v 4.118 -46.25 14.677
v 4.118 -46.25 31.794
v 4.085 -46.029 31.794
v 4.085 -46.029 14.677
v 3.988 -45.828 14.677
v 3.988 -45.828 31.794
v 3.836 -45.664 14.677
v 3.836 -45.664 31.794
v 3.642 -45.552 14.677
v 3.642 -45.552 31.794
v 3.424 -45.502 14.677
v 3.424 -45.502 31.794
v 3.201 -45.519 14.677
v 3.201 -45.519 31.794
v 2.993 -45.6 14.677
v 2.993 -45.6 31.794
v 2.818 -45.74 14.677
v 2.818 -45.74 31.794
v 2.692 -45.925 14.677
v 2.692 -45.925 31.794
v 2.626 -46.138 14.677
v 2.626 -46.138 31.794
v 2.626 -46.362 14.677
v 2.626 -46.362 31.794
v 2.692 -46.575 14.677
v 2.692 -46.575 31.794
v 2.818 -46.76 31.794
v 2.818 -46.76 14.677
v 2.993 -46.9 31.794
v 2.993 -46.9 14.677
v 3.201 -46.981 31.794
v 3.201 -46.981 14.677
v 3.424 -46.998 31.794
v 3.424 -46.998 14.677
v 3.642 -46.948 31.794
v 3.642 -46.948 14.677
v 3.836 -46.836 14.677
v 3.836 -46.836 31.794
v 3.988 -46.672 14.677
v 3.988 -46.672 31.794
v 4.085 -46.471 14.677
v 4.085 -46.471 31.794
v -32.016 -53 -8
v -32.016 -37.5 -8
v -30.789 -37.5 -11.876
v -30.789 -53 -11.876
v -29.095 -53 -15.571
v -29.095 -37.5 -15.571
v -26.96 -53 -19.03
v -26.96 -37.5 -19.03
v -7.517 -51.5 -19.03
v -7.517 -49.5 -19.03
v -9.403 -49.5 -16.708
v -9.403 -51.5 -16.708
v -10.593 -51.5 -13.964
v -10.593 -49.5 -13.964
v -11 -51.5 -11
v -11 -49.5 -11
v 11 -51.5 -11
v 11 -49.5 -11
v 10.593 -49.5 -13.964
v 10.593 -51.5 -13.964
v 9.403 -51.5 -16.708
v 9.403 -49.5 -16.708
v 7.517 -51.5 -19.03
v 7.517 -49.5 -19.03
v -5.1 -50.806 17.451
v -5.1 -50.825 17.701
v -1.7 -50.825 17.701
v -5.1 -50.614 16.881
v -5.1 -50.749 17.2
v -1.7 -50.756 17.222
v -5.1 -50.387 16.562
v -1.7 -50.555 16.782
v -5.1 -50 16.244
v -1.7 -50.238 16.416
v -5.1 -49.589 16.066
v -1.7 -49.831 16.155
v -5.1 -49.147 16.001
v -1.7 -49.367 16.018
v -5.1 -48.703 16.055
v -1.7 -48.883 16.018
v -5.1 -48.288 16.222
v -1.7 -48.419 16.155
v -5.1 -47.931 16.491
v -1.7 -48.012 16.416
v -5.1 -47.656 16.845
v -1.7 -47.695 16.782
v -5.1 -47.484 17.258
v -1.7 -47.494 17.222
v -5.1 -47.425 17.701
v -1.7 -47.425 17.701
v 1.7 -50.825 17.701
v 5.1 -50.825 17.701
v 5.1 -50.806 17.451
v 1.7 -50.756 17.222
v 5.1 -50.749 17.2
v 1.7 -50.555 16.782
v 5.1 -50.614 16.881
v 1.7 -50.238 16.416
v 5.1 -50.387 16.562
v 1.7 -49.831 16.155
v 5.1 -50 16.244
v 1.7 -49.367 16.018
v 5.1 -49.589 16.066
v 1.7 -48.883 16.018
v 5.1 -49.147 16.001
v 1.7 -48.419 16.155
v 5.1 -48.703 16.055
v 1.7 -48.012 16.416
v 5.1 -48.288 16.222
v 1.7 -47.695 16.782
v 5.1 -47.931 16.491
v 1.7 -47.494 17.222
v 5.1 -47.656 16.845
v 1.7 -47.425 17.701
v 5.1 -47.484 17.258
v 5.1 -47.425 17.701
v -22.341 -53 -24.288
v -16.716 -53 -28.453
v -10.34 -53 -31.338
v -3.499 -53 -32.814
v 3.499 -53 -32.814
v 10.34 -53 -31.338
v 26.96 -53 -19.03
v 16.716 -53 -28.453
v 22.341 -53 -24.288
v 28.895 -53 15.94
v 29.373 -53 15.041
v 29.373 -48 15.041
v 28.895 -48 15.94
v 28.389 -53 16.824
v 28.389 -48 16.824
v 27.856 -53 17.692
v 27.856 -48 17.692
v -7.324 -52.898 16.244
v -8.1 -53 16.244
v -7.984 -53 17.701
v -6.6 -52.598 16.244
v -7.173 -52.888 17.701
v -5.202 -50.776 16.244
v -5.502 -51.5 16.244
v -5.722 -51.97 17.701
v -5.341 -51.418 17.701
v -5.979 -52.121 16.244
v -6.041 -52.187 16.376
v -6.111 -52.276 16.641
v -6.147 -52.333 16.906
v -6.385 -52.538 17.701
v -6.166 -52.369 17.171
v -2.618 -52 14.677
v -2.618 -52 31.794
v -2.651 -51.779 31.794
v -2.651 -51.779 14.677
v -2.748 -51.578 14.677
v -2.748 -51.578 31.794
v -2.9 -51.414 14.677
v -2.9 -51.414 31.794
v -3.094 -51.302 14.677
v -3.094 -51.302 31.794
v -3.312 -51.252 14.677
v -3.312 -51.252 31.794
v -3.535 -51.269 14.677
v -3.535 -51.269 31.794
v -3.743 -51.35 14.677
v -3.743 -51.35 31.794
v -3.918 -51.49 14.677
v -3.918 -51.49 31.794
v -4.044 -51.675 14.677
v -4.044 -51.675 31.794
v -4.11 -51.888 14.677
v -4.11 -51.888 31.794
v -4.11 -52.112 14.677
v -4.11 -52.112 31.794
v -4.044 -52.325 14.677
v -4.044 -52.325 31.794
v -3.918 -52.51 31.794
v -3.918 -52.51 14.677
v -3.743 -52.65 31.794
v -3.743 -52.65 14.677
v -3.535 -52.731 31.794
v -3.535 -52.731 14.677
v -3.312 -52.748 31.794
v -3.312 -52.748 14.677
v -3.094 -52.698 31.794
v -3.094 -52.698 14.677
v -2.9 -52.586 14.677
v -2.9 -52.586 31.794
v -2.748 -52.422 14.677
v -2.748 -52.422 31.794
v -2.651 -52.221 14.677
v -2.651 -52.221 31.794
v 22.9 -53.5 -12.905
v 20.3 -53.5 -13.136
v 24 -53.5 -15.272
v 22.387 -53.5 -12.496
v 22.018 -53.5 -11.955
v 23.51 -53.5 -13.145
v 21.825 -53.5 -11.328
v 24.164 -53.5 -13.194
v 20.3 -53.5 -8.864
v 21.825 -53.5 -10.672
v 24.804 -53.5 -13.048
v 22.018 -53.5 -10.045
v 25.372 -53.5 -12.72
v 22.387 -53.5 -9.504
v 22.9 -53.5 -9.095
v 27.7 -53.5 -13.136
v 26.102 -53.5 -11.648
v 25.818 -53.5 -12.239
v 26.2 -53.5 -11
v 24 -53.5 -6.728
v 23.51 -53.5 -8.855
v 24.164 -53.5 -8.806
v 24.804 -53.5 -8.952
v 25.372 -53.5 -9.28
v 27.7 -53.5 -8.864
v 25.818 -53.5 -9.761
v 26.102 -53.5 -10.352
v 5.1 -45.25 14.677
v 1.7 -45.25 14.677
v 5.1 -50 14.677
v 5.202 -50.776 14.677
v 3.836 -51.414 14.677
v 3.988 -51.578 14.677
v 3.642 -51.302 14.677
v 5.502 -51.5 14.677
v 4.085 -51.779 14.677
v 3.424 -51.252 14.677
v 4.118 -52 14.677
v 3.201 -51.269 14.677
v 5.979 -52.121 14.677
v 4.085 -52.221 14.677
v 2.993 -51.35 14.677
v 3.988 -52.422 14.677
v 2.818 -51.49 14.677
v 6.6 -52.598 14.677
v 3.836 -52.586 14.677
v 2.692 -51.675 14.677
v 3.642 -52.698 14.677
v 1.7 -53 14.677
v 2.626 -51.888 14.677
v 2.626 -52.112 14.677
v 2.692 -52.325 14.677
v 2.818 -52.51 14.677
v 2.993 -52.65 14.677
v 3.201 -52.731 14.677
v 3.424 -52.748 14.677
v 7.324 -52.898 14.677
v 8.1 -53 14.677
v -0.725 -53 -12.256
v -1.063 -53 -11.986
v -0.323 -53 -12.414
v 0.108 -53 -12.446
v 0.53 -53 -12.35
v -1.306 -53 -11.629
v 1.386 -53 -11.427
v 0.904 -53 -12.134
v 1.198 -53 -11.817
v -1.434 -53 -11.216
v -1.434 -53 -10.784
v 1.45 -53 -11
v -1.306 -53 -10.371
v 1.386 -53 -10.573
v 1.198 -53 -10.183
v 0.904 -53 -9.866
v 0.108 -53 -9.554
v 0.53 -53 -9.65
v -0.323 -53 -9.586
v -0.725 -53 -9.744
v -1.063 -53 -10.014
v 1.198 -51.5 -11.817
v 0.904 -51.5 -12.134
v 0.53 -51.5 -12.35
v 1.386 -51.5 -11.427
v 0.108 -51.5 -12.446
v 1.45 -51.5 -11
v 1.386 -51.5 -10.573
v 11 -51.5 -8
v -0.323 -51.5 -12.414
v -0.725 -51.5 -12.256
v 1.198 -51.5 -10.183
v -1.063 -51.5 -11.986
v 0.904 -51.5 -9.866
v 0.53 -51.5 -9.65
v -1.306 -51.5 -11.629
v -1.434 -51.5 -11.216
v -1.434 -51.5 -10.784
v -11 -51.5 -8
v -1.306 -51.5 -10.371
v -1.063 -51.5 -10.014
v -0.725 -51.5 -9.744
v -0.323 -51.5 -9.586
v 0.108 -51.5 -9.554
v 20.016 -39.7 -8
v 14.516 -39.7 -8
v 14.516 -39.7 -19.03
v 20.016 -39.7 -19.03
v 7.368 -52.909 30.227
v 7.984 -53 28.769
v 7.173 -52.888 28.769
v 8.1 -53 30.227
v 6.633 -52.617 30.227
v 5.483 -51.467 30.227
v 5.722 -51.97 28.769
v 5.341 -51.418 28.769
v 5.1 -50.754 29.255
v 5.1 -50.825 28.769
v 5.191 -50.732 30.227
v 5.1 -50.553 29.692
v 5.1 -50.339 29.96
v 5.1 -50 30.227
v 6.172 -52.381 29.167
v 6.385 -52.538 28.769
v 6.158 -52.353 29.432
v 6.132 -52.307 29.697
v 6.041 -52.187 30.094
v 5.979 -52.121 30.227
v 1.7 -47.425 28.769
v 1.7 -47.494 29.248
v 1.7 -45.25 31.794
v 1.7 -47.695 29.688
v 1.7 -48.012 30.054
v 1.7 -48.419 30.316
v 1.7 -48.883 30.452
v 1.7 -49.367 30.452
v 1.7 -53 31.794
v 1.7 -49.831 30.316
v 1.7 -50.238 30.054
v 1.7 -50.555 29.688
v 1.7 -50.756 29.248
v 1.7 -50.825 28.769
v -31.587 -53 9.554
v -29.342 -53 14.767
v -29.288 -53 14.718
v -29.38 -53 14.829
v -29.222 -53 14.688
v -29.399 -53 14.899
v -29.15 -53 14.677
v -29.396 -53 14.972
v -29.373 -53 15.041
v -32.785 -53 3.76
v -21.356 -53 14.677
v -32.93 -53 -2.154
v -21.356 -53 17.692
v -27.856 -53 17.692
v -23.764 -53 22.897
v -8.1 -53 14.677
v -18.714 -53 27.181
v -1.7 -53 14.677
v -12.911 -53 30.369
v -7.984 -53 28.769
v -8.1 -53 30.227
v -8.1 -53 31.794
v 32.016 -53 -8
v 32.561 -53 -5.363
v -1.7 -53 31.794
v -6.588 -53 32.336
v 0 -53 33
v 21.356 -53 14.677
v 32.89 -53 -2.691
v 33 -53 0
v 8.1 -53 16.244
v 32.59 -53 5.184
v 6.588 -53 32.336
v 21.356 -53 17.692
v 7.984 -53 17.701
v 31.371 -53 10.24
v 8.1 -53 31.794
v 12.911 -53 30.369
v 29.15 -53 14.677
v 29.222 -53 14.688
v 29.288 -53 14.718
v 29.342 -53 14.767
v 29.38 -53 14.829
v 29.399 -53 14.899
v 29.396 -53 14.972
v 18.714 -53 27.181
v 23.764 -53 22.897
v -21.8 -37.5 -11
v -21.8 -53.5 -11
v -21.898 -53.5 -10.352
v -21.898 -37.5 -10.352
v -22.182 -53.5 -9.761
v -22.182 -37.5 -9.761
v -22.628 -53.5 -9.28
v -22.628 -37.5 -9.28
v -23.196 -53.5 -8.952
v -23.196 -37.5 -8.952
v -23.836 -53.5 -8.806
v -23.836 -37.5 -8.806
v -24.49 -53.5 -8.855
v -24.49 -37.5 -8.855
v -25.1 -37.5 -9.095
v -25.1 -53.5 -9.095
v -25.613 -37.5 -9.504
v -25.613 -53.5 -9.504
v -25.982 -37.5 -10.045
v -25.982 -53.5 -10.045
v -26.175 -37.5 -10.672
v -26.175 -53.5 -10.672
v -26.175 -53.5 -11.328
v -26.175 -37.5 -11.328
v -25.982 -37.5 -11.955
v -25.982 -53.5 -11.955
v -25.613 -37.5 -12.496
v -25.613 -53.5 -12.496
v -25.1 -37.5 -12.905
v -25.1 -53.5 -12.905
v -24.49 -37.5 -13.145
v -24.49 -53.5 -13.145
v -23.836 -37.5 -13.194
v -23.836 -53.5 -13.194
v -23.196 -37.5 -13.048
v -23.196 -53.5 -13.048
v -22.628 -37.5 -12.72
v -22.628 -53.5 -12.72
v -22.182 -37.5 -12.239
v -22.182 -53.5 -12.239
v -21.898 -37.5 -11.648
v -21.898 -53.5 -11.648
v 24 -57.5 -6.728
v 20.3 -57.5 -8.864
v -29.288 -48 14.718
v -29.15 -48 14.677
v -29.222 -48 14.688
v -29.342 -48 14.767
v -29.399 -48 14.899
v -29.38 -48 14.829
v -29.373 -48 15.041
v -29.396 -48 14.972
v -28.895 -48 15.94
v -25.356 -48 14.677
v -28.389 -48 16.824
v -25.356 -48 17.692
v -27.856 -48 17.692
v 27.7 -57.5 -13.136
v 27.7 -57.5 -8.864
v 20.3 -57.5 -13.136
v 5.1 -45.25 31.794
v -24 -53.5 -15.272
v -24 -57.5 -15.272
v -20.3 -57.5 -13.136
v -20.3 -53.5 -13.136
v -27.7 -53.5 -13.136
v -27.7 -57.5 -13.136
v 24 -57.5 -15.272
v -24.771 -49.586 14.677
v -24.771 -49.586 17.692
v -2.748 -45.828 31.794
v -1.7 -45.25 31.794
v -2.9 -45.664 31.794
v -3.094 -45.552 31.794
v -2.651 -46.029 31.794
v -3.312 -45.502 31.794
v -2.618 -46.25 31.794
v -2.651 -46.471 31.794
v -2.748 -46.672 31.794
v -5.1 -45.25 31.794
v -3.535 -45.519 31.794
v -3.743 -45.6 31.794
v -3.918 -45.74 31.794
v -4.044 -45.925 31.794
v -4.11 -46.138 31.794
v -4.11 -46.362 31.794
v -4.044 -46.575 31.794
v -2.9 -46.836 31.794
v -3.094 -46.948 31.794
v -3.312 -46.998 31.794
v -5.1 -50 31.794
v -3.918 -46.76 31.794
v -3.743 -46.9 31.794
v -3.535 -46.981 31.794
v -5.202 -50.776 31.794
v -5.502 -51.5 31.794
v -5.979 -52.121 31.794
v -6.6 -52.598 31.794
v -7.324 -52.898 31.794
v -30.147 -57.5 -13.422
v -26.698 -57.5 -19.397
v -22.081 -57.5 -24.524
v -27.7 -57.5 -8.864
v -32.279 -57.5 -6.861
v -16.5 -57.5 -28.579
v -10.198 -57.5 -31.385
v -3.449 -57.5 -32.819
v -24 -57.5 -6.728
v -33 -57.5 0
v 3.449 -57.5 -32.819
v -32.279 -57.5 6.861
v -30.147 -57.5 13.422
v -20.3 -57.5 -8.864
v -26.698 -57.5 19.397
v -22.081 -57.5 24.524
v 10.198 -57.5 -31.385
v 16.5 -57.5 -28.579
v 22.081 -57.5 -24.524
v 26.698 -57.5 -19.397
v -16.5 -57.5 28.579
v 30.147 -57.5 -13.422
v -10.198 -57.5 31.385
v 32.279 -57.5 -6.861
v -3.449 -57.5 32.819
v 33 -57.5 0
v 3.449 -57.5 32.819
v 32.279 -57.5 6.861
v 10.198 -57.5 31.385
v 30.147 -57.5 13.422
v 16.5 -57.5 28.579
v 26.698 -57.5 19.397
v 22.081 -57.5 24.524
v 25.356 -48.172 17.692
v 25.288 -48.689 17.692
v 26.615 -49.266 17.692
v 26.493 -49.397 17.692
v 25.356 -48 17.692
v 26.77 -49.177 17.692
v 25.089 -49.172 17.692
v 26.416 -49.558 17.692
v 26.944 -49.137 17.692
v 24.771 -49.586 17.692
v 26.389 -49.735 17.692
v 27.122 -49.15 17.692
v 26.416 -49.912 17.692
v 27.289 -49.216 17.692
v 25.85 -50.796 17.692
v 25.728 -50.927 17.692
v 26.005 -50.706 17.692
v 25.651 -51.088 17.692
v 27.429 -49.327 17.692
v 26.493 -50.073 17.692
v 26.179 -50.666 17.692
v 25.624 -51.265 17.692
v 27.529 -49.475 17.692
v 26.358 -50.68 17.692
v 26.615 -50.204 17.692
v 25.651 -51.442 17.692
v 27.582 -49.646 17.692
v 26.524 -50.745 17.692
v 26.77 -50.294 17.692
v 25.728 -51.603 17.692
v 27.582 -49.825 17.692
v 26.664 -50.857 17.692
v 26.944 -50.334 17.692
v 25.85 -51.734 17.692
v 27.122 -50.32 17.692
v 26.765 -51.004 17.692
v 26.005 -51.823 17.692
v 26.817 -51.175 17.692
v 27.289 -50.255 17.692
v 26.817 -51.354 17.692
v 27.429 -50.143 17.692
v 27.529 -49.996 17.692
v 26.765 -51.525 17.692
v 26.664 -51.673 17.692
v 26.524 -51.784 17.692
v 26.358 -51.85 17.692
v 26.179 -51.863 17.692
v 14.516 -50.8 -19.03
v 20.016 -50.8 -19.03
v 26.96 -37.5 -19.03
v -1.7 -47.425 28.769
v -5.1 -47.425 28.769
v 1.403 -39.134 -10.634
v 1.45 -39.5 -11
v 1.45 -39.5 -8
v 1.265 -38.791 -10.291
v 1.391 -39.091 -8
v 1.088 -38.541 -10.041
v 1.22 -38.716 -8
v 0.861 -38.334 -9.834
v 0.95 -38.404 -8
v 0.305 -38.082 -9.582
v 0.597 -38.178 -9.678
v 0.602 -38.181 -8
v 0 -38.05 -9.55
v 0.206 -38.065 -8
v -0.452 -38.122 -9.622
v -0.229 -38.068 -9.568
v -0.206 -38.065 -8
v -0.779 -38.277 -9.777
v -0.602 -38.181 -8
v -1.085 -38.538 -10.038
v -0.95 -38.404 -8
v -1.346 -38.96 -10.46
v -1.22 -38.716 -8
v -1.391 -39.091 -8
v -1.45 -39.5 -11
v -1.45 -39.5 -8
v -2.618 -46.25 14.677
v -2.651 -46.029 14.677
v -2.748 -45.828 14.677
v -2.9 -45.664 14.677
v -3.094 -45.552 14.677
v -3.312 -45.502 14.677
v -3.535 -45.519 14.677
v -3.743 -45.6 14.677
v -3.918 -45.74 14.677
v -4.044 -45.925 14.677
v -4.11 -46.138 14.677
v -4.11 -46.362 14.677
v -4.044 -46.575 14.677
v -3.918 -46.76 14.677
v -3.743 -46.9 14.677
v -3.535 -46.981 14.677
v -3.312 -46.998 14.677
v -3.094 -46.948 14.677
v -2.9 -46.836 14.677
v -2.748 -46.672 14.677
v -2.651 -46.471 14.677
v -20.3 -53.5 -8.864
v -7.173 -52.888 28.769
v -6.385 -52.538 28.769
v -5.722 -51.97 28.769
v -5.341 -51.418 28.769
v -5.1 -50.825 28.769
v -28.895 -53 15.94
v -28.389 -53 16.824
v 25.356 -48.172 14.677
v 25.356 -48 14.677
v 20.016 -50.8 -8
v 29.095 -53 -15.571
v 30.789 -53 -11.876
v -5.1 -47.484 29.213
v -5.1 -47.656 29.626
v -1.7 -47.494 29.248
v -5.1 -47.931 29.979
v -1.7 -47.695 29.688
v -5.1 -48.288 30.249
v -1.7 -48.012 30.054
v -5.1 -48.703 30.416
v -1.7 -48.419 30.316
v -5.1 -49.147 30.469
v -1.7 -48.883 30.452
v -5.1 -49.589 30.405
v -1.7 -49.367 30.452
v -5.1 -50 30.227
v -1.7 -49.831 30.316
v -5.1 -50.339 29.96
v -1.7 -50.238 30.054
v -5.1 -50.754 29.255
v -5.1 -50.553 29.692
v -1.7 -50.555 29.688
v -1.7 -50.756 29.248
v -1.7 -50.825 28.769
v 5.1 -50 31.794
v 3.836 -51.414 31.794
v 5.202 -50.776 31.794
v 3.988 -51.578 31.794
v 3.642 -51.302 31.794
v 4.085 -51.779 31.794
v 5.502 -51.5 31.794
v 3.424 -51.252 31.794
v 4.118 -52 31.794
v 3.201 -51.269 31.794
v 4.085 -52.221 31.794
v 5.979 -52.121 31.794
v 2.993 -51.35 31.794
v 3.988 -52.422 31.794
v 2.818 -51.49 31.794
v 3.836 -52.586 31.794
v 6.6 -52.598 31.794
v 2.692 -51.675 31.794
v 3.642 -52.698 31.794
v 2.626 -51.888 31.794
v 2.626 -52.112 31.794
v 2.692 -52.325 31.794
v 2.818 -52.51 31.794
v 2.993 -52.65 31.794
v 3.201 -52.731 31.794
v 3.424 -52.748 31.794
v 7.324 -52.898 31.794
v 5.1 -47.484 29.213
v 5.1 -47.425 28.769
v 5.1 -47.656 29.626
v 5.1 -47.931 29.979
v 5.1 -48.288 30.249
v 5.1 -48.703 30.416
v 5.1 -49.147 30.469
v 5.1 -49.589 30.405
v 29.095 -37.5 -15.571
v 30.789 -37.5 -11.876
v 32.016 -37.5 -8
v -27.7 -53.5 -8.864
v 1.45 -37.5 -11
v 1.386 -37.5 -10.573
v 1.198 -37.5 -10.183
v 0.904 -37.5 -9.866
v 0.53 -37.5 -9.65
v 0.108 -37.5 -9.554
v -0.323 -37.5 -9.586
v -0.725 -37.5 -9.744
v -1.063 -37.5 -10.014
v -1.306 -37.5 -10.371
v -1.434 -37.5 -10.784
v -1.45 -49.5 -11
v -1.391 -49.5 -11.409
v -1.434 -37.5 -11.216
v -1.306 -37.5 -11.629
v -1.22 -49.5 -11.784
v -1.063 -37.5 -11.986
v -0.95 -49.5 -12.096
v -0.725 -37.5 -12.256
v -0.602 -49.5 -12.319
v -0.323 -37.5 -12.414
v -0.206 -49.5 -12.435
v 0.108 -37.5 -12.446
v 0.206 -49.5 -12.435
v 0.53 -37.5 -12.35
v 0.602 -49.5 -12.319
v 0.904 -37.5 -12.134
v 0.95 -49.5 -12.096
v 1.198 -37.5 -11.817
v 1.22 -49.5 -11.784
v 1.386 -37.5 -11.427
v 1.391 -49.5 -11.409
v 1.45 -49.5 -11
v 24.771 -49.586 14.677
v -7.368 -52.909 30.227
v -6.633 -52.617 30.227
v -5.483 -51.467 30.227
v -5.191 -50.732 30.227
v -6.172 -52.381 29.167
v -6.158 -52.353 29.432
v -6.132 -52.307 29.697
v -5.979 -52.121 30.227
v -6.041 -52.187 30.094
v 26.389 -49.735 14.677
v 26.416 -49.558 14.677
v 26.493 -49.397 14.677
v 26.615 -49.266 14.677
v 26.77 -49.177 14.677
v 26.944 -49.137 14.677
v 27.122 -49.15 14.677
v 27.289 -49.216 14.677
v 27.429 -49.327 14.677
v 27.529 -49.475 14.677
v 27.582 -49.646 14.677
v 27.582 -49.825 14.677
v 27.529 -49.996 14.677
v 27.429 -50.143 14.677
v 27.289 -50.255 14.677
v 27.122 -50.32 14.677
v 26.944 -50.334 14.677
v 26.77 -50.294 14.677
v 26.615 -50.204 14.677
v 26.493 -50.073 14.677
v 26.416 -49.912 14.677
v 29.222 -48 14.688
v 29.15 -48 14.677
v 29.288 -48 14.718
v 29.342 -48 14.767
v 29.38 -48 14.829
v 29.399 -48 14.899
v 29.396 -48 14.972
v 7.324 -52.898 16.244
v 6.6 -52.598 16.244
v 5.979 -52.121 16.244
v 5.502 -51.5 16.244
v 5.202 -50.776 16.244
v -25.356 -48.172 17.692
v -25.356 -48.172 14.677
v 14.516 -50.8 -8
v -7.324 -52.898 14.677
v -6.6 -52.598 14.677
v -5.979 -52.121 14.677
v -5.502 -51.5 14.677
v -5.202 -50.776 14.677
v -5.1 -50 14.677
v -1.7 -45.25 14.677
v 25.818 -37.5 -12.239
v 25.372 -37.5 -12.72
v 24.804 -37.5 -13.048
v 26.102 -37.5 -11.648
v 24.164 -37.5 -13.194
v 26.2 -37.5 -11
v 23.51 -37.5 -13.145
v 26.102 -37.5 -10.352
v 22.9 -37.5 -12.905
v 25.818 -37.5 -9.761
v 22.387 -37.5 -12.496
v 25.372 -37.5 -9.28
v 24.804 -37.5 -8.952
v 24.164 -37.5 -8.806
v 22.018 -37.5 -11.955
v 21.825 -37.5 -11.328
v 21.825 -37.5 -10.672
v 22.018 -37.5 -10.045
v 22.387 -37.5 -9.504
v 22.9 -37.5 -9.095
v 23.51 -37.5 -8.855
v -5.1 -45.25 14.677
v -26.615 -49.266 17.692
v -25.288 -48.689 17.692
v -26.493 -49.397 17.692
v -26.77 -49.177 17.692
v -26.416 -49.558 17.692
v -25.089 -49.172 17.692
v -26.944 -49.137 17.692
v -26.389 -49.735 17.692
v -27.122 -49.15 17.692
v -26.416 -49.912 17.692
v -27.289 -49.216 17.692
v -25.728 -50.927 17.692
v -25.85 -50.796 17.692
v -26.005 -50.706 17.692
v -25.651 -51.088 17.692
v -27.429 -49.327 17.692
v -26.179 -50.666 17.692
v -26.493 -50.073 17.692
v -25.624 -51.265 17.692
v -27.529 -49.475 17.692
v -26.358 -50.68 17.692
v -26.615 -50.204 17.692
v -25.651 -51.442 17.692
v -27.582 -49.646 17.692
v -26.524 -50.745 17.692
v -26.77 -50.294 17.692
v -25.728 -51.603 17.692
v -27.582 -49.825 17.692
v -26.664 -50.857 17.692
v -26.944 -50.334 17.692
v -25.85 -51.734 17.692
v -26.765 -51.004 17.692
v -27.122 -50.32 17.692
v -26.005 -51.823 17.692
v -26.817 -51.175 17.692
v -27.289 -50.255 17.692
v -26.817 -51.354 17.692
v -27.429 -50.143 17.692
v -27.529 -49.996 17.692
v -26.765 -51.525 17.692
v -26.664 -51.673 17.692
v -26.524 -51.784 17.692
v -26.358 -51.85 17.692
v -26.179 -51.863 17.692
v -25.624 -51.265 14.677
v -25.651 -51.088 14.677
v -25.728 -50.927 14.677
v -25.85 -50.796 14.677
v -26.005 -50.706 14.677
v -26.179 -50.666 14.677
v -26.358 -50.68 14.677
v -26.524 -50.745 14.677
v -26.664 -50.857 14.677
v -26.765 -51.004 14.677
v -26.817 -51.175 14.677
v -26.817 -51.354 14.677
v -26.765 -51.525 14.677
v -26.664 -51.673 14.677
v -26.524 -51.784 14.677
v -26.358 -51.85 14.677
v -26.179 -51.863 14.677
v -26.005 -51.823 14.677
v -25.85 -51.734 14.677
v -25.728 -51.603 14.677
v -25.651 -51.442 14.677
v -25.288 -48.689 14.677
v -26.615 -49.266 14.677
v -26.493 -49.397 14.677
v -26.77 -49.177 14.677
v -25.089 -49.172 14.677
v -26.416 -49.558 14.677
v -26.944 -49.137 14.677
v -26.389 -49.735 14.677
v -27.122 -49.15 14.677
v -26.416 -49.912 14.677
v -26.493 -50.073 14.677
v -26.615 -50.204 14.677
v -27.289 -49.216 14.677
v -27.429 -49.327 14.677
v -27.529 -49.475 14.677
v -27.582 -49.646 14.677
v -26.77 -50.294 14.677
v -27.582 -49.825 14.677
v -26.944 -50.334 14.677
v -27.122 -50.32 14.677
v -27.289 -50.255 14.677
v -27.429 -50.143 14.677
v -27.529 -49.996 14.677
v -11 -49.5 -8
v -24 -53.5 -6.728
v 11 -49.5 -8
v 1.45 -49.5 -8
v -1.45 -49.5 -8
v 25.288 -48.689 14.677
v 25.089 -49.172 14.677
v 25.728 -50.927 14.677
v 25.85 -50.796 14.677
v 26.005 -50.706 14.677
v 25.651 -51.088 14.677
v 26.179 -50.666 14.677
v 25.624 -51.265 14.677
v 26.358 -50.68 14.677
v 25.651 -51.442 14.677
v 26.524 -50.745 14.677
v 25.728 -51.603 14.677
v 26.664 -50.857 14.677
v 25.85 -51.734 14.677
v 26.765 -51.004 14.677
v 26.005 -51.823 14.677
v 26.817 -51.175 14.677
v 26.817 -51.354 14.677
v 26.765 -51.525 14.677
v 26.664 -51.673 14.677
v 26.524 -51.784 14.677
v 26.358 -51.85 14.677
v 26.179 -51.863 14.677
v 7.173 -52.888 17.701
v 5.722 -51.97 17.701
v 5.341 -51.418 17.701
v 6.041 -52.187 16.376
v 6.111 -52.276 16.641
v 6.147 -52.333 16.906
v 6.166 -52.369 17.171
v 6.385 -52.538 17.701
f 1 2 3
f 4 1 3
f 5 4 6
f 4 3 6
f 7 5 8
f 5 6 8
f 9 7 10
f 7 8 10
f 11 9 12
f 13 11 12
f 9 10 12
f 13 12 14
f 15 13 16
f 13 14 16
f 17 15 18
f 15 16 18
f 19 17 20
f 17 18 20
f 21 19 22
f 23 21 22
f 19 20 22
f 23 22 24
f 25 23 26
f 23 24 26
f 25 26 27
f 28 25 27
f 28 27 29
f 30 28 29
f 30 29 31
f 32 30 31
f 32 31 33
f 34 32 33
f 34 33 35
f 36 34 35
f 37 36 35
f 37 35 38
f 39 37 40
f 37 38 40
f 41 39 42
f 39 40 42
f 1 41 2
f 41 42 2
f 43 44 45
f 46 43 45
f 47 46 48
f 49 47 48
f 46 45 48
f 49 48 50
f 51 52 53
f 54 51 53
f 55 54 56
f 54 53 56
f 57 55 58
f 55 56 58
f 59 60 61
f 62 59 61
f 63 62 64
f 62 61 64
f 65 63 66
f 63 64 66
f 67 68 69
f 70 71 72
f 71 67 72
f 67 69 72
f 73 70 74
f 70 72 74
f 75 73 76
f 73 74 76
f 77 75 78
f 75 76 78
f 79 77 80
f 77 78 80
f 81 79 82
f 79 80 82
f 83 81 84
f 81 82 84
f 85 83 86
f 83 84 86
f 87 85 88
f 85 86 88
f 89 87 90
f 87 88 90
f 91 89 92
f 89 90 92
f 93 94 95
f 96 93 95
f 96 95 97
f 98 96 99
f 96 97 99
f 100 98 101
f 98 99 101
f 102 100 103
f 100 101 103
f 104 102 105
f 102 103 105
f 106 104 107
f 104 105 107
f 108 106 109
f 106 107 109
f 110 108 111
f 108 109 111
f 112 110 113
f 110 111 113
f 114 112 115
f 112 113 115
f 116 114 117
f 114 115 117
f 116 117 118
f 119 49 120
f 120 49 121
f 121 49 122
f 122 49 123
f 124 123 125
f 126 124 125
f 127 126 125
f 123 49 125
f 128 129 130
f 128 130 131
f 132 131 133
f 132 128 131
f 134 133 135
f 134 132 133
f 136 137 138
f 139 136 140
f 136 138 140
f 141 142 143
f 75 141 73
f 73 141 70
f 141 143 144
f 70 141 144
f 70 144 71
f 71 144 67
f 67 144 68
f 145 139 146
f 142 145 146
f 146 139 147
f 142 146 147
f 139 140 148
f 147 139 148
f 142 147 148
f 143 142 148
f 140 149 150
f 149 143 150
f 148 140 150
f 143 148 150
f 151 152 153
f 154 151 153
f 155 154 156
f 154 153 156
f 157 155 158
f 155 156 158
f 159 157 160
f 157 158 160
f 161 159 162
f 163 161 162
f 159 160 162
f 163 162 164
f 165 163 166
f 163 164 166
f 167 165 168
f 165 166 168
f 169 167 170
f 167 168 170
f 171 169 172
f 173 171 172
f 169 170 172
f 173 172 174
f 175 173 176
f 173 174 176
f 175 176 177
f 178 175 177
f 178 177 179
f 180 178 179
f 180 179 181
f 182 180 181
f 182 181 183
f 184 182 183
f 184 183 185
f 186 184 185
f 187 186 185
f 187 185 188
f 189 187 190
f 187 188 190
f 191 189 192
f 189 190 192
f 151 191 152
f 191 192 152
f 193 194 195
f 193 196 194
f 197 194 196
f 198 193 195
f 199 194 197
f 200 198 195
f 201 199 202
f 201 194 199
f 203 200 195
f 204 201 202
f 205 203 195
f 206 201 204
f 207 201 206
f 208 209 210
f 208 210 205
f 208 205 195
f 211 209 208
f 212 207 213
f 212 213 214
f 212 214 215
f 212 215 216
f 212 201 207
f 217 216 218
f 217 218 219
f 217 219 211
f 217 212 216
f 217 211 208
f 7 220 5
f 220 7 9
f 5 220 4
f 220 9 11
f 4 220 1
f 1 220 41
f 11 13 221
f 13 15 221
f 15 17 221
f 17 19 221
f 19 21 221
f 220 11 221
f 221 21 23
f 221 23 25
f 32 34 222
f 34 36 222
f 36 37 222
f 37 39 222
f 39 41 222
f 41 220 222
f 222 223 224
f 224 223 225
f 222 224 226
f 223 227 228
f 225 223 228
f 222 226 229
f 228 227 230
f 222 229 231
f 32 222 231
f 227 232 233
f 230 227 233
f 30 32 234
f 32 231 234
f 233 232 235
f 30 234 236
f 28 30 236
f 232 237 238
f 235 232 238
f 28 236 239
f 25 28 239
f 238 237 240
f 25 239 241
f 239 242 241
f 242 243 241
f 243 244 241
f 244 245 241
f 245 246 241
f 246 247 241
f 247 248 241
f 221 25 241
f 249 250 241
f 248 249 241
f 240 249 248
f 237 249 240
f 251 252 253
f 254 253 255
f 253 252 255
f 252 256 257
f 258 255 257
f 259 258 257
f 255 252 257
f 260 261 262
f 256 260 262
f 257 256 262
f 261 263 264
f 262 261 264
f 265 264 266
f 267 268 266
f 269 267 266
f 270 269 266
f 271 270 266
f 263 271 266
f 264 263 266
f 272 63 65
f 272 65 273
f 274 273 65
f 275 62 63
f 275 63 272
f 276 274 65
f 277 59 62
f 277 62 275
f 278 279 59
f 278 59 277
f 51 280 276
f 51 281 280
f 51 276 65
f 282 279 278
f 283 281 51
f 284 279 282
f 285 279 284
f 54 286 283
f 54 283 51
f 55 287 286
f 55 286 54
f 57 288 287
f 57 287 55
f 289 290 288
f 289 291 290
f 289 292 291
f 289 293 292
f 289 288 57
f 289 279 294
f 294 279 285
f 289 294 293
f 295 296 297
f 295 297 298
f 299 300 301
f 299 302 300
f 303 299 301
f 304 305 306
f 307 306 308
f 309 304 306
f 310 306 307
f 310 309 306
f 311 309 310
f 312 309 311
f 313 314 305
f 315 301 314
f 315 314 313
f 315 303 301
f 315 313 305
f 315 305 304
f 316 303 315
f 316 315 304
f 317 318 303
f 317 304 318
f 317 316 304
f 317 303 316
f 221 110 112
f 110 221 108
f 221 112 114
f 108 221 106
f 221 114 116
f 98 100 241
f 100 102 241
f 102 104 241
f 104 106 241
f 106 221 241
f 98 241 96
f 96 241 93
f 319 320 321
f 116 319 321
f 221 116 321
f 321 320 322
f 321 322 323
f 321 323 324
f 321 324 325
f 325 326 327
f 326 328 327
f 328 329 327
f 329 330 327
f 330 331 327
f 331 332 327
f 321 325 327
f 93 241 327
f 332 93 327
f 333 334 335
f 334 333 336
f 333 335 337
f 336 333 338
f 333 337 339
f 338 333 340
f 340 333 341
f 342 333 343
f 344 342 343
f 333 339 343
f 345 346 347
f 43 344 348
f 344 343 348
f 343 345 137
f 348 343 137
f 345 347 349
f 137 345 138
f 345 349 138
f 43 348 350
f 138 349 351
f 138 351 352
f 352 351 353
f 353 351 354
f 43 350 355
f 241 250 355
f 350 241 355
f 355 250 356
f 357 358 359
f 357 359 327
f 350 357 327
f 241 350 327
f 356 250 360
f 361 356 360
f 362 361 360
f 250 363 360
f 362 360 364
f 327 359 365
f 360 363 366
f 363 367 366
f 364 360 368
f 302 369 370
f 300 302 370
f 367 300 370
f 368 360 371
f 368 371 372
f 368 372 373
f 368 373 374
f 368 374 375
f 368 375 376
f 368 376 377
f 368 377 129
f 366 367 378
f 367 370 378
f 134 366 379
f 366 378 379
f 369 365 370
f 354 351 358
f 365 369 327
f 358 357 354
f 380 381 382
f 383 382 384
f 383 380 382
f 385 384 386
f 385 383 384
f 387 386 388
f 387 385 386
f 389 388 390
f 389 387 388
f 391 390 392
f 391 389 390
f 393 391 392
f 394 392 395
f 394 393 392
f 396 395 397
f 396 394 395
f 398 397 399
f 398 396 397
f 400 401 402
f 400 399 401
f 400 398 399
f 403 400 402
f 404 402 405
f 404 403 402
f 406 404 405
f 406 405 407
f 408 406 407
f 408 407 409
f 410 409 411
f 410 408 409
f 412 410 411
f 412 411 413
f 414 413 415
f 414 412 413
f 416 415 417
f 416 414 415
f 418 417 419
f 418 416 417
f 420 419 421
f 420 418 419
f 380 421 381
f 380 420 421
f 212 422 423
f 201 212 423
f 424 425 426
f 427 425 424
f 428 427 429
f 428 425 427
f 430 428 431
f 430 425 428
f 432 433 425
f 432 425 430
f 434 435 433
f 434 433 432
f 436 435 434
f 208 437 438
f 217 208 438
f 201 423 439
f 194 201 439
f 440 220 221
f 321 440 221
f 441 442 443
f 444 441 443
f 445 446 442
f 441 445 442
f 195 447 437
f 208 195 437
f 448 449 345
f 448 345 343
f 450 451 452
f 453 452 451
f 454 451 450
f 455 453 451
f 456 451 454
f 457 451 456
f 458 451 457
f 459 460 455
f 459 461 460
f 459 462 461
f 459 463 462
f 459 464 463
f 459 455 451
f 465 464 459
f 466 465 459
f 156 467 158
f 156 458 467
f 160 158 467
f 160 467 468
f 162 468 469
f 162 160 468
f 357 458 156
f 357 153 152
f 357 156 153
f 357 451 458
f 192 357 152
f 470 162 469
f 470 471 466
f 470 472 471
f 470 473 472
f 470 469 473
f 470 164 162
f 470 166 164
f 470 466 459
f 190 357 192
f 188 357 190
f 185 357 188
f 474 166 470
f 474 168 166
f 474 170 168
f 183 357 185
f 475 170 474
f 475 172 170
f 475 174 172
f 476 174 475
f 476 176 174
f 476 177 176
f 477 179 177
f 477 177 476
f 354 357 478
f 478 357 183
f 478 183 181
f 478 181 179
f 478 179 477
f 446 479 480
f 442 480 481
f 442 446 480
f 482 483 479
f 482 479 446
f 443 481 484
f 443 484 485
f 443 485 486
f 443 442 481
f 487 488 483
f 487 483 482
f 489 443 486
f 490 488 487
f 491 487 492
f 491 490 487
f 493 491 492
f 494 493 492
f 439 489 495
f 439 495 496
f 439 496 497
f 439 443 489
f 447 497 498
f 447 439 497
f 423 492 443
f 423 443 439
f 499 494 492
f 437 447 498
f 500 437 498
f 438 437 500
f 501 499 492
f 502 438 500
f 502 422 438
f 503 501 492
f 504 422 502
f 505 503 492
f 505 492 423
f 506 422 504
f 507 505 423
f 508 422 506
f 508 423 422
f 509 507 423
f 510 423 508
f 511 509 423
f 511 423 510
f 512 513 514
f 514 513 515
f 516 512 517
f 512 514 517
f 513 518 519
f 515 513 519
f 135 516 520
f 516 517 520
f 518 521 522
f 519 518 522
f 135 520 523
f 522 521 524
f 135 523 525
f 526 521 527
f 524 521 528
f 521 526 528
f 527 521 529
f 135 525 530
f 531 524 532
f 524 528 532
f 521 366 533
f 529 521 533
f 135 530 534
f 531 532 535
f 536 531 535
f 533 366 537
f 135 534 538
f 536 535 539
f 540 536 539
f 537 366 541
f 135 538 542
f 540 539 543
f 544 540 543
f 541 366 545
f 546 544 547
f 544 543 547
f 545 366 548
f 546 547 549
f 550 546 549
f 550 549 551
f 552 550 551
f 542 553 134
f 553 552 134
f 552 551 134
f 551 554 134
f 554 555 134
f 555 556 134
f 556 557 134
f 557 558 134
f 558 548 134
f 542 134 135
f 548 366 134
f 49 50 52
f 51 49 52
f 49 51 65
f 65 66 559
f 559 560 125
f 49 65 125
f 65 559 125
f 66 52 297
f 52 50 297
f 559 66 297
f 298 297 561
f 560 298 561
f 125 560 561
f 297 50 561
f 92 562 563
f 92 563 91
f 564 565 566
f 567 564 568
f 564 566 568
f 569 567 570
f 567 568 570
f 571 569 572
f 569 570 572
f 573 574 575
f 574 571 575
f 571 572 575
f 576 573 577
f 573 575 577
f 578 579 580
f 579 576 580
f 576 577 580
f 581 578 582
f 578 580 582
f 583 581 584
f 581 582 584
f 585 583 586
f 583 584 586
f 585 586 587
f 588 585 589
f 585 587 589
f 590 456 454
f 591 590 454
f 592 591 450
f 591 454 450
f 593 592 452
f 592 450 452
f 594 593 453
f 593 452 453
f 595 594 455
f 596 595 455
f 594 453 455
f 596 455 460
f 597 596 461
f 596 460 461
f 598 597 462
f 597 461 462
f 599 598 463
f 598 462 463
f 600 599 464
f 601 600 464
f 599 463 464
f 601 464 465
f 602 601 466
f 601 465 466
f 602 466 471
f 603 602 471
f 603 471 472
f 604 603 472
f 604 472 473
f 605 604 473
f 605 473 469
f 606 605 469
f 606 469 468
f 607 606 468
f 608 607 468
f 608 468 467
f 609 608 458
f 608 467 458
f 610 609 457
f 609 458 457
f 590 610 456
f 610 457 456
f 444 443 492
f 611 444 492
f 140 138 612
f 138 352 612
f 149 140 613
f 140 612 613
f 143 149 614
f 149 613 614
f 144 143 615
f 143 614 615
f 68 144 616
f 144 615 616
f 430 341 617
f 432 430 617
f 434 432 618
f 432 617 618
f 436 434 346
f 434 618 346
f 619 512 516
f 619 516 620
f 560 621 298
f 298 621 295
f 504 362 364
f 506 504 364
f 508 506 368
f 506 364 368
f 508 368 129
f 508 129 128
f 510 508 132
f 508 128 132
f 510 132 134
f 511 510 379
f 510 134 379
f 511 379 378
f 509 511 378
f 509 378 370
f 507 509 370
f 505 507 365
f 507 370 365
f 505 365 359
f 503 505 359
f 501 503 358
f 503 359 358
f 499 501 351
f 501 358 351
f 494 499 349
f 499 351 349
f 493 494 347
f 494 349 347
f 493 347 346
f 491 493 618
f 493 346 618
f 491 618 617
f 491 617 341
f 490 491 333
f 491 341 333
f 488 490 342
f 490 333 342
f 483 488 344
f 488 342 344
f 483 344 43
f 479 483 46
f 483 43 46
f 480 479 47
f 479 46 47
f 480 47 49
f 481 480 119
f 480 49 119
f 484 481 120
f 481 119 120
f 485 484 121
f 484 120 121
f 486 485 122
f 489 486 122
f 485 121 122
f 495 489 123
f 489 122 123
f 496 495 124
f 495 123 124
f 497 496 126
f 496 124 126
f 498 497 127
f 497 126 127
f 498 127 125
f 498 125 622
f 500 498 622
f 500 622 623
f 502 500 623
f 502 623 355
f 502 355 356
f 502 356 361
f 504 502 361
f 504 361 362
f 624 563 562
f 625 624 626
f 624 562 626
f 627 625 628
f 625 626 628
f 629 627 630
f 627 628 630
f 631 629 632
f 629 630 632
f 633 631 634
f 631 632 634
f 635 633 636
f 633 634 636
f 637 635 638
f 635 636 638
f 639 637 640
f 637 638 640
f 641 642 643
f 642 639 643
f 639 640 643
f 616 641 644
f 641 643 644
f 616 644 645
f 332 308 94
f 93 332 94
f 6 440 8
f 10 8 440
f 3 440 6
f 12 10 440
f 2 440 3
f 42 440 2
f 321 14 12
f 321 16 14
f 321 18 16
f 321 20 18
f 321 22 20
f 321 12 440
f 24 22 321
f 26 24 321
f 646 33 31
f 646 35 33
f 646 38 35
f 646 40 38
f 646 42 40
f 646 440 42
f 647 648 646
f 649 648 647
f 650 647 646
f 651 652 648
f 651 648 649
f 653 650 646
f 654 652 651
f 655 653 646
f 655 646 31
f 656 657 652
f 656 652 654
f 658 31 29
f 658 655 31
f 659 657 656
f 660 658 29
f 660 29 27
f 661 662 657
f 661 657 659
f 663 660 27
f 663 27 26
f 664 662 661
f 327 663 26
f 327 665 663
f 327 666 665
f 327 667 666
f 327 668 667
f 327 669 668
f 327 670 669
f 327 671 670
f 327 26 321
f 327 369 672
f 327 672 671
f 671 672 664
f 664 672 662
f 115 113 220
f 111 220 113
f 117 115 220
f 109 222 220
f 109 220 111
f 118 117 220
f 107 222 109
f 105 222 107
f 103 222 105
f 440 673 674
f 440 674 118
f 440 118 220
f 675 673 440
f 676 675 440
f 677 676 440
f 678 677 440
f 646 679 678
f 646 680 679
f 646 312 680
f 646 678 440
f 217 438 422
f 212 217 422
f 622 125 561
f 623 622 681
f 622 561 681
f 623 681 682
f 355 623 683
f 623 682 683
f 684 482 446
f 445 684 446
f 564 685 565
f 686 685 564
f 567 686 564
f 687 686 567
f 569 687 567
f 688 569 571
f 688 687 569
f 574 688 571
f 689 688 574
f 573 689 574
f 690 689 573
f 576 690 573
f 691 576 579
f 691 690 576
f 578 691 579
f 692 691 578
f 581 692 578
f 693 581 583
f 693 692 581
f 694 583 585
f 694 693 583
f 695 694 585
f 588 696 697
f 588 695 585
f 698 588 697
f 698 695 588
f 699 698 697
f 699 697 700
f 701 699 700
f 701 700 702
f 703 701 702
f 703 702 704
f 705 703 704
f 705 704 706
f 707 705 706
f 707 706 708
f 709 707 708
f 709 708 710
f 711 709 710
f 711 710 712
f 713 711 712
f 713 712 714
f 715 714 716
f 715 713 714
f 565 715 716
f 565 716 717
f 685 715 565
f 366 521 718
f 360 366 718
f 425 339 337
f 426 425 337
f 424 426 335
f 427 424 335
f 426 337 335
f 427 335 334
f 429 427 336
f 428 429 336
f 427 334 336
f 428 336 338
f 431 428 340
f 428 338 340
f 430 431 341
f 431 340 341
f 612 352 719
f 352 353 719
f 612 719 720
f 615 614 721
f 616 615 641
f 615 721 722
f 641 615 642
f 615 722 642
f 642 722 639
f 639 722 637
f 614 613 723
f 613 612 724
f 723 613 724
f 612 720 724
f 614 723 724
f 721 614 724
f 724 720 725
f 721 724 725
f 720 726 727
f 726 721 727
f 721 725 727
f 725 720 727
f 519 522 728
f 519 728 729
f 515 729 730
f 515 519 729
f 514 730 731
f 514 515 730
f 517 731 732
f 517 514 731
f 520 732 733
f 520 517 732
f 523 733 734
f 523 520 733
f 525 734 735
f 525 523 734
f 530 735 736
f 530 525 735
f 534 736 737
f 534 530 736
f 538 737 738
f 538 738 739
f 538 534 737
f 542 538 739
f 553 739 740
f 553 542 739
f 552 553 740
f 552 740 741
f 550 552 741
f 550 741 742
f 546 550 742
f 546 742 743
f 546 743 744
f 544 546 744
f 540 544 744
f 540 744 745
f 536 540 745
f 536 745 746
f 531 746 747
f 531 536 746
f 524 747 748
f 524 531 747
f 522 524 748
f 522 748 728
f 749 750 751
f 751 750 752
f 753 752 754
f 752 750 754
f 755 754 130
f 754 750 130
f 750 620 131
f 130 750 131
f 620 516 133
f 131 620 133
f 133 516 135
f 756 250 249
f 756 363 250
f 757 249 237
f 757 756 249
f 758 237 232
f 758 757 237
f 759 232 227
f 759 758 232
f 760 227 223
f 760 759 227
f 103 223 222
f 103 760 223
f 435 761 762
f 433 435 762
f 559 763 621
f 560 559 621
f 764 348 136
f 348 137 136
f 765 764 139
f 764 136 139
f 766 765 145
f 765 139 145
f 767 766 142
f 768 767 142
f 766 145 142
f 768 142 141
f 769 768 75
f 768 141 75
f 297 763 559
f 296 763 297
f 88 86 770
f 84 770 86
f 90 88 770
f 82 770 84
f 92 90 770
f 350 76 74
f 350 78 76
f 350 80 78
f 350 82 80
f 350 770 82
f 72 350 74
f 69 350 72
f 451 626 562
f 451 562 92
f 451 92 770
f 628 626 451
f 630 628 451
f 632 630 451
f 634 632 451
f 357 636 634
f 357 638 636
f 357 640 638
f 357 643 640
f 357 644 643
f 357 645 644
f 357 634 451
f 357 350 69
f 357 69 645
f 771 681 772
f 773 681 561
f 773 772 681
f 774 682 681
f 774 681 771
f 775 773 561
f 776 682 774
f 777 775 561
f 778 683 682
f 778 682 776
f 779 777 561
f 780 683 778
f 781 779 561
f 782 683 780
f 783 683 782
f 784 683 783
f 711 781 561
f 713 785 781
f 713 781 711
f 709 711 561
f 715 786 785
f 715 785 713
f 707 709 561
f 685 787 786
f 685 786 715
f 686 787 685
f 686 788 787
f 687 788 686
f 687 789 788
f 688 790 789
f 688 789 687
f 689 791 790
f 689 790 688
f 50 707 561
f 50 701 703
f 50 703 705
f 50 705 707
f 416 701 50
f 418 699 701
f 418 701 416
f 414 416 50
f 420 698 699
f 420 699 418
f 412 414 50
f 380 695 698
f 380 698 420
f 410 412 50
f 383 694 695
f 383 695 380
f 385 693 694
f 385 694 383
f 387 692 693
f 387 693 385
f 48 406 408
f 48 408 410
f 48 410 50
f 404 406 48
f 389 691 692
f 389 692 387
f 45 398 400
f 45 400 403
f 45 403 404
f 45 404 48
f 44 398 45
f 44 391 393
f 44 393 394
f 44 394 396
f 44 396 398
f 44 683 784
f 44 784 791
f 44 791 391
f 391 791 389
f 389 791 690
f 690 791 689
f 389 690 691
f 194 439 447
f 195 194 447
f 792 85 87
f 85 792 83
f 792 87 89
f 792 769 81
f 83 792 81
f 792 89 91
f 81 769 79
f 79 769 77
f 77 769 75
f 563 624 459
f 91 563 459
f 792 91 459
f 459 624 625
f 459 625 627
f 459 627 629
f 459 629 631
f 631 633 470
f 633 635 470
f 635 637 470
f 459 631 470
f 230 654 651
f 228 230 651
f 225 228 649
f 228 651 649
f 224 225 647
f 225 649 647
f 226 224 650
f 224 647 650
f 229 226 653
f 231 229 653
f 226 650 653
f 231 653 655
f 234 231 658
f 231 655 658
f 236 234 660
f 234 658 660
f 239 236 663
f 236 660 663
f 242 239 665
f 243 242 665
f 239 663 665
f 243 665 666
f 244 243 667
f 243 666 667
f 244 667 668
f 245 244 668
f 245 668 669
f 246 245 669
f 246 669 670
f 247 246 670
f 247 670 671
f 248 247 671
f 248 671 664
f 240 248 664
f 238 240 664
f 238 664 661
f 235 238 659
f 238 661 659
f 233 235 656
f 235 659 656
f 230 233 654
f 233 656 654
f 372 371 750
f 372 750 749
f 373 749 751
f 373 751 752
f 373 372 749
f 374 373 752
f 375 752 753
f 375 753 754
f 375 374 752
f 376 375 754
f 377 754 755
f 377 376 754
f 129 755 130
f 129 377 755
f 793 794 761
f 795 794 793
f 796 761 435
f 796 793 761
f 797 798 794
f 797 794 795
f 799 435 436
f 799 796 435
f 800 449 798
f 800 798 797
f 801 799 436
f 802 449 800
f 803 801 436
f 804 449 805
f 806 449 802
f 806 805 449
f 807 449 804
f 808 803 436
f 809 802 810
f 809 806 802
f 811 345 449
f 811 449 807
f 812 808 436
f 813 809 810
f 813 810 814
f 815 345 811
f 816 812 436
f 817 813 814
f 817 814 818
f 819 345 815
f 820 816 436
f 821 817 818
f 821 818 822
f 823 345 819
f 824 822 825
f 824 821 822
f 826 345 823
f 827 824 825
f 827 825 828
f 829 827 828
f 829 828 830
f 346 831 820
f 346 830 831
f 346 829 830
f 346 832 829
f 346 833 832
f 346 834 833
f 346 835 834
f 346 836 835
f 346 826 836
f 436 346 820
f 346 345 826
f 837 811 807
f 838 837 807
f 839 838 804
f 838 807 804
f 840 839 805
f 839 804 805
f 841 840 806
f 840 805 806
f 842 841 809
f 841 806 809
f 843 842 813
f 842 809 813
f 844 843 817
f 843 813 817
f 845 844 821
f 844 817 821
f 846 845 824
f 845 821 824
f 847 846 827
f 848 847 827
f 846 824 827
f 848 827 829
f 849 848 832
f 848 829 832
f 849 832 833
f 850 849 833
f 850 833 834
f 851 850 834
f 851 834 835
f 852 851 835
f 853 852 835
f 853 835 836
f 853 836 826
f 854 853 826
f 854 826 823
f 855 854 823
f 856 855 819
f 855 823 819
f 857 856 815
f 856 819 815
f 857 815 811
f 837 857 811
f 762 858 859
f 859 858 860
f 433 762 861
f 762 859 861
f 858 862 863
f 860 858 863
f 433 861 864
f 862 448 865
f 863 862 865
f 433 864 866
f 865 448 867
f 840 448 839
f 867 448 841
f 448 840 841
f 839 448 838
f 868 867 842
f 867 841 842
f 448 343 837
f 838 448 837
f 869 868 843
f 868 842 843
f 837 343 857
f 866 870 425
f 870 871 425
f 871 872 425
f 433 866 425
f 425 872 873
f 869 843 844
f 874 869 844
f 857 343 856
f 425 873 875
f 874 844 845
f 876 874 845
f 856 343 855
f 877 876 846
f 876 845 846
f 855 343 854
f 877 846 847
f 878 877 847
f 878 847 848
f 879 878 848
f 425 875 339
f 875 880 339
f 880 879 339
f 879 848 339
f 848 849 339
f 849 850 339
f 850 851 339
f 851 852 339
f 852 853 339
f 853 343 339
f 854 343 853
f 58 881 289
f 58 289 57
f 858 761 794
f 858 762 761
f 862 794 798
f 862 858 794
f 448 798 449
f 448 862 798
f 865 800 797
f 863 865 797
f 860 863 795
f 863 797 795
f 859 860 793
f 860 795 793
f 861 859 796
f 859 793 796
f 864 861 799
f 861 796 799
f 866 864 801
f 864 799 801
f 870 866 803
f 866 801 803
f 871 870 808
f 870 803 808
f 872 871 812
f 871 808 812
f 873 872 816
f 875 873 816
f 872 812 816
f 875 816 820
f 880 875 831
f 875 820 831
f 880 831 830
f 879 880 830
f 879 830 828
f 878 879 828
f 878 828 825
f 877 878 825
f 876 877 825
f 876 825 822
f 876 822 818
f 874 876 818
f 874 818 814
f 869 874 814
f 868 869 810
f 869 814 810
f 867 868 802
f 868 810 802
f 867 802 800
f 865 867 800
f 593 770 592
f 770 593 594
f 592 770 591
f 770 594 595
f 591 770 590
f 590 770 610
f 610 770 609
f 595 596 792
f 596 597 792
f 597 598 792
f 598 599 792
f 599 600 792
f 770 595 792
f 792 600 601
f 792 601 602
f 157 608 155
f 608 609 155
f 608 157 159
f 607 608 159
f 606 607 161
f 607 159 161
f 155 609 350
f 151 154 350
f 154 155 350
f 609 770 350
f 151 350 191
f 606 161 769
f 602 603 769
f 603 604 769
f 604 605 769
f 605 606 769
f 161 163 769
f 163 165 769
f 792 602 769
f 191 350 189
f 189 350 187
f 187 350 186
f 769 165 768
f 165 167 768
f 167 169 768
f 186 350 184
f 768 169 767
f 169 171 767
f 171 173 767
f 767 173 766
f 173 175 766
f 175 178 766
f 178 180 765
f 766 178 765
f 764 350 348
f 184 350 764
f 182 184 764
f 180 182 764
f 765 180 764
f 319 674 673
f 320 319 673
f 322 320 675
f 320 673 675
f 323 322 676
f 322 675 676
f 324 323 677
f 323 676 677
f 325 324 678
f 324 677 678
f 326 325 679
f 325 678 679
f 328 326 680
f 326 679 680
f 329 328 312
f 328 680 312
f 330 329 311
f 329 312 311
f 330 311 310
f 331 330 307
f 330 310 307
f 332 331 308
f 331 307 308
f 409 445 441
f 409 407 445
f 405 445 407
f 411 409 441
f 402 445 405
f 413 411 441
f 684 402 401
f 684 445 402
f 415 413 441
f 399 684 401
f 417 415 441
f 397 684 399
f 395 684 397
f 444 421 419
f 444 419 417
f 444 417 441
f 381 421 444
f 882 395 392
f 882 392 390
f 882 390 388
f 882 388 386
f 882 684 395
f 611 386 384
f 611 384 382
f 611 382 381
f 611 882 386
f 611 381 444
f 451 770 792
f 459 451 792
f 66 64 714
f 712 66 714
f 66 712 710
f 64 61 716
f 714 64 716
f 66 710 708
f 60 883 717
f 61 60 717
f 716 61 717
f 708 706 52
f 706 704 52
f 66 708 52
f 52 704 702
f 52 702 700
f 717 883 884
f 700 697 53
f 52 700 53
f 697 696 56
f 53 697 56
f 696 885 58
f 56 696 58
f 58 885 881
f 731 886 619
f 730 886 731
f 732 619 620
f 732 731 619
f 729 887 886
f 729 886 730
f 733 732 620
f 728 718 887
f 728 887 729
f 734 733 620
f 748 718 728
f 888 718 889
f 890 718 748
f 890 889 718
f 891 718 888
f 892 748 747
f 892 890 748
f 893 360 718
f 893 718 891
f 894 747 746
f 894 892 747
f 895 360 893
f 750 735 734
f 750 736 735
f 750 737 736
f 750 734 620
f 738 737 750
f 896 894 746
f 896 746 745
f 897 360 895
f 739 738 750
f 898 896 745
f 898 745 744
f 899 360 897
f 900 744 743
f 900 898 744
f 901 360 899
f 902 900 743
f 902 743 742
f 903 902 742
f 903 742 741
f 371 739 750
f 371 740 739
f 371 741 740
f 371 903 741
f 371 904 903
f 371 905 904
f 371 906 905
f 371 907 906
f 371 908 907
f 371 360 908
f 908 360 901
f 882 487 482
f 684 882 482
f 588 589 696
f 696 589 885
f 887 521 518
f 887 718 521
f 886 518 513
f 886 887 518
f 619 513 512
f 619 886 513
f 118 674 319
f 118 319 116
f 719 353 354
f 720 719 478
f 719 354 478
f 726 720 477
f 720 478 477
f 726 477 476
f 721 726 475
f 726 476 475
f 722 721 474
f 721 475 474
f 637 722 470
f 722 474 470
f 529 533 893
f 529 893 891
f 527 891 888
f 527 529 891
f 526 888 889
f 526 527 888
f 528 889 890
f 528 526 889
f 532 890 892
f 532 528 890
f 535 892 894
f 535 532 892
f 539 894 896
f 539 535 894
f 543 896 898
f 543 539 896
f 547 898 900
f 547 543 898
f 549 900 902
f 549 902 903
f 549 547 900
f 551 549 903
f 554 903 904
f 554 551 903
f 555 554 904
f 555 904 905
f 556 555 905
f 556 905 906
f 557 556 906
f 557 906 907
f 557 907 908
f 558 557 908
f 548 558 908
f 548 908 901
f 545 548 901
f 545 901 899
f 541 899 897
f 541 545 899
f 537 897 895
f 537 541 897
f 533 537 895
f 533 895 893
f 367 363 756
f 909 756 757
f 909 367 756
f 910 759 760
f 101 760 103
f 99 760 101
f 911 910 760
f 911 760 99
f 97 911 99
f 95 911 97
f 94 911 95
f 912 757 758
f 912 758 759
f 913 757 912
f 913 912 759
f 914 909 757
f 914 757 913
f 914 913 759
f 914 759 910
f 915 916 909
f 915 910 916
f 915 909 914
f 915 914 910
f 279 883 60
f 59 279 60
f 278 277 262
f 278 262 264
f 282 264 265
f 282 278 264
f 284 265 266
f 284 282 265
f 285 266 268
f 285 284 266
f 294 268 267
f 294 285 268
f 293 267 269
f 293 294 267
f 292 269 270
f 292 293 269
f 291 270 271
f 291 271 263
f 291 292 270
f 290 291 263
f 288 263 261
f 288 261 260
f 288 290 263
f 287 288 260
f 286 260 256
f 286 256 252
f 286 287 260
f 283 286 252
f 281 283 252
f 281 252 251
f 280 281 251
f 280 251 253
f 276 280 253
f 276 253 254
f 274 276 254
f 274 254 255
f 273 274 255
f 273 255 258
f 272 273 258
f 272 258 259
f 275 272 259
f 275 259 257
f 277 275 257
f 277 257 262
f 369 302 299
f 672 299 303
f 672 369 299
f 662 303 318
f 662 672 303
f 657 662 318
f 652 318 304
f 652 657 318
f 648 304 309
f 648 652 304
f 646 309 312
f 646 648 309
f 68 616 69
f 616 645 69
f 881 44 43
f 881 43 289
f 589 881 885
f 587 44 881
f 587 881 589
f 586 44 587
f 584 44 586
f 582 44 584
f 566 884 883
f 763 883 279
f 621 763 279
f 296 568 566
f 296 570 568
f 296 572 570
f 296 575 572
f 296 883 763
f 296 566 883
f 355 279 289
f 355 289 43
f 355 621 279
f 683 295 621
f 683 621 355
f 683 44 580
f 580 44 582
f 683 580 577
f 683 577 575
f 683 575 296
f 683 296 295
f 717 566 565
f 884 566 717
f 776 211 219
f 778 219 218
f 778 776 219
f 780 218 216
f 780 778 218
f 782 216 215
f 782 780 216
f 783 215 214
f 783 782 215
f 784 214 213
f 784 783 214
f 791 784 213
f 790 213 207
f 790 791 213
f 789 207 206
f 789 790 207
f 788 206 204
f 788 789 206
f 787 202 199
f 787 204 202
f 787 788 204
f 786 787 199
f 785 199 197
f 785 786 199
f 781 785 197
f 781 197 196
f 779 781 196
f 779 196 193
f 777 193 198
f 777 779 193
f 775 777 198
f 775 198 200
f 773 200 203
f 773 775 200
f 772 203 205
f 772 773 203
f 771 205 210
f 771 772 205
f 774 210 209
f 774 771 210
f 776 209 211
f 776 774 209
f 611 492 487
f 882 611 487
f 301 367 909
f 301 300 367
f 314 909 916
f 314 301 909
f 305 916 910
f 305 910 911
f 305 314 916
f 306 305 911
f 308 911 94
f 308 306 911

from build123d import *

# Parameters (mm, degrees)
SKETCH002_R     = 2.2
SKETCH002_R_2   = 1.45
PAD002_DEPTH    = 15.5
SKETCH003_R     = 33
SKETCH003_R_2   = 2.2
PAD003_DEPTH    = 4.5
POCKET_DEPTH    = 3
POCKET001_DEPTH = 4
POCKET003_DEPTH = 2
SKETCH011_W     = 5.5
SKETCH011_H     = 11.1
POCKET004_DEPTH = 25.001
SKETCH012_W     = 3.4
SKETCH012_H     = 17.1165875376
PAD007_DEPTH    = 7.75
POCKET005_DEPTH = 229.0145930205
SKETCH017_R     = 0.75
POCKET008_DEPTH = 17.1165875376
PAD008_DEPTH    = 5
SKETCH020_R     = 0.6
POCKET009_DEPTH = 3.0152762344
FILLET_R        = 3
CHAMFER_SIZE    = 4
CHAMFER001_SIZE = 4
FILLET006_R     = 2
FILLET007_R     = 2


with BuildPart() as part:
    # Sketch002 (on Face1 of ShapeBinder) → Pad002 (new body)
    with BuildSketch(Plane.XZ.offset(37.5)):
        with BuildLine():
            Line((-32.0156211872, -8), (32.0156211872, -8))
            ThreePointArc((26.9599822671, -19.0304849165), (29.9991391555, -13.7496054463), (32.0156211872, -8))
            Line((-26.9599822671, -19.0304849165), (26.9599822671, -19.0304849165))
            ThreePointArc((-32.0156211872, -8), (-29.9991391555, -13.7496054463), (-26.9599822671, -19.0304849165))
        make_face()
        with Locations((24, -11)):
            Circle(SKETCH002_R, mode=Mode.SUBTRACT)
        with Locations((0, -11)):
            Circle(SKETCH002_R_2, mode=Mode.SUBTRACT)
        with Locations((-24, -11)):
            Circle(SKETCH002_R, mode=Mode.SUBTRACT)
    extrude(amount=PAD002_DEPTH)

    # Sketch003 (on Face9 of Pad002) → Pad003 (join)
    with BuildSketch(Plane.XZ.offset(53)):
        Circle(SKETCH003_R)
        with Locations((24, -11)):
            Circle(SKETCH003_R_2, mode=Mode.SUBTRACT)
        with Locations((-24, -11)):
            Circle(SKETCH003_R_2, mode=Mode.SUBTRACT)
    extrude(amount=PAD003_DEPTH)

    # Sketch007 (on Face2 of Pad003) → Pocket (cut)
    with BuildSketch(Plane(origin=(0, -4.5, -8), x_dir=(1, 0, 0), z_dir=(0, 0, 1))):
        with BuildLine():
            ThreePointArc((1.45, -35), (0, -33.55), (-1.45, -35))
            Line((-1.45, -35), (-1.45, -45))
            Line((-1.45, -45), (1.45, -45))
            Line((1.45, -35), (1.45, -45))
        make_face()
    extrude(amount=-POCKET_DEPTH, mode=Mode.SUBTRACT)

    # Sketch008 (on Face16 of Pocket) → Pocket001 (cut)
    with BuildSketch(Plane.XZ.offset(57.5)):
        Polygon((27.7, -13.136195996), (27.7, -8.863804004), (24, -6.727608008), (20.3, -8.863804004), (20.3, -13.136195996), (24, -15.272391992), align=None)
        Polygon((-20.3, -13.136195996), (-20.3, -8.863804004), (-24, -6.727608008), (-27.7, -8.863804004), (-27.7, -13.136195996), (-24, -15.272391992), align=None)
    extrude(amount=-POCKET001_DEPTH, mode=Mode.SUBTRACT)

    # Sketch010 (on Face10 of Pocket001) → Pocket003 (cut)
    with BuildSketch(Plane(origin=(0, -49.5, 0), x_dir=(-1, 0, 0), z_dir=(0, 1, 0))):
        with BuildLine():
            ThreePointArc((-11, -11.0000000007), (6e-10, -22), (11, -10.9999999995))
            Line((11, 0), (11, -10.9999999995))
            Line((-11, 0), (11, 0))
            Line((-11, 0), (-11, -11.0000000007))
        make_face()
    extrude(amount=-POCKET003_DEPTH, mode=Mode.SUBTRACT)

    # Sketch011 (on Face2 of Pocket003) → Pocket004 (cut, through all)
    with BuildSketch(Plane(origin=(0, -4.5, -8), x_dir=(1, 0, 0), z_dir=(0, 0, 1))):
        with Locations((17.2656211872, -40.75)):
            Rectangle(SKETCH011_W, SKETCH011_H)
    extrude(amount=-POCKET004_DEPTH, mode=Mode.SUBTRACT)

    # Sketch012 (on Face6 of Pocket004) → Pad007 (join)
    with BuildSketch(Plane(origin=(0, -53, 0), x_dir=(-1, 0, 0), z_dir=(0, 1, 0))):
        with Locations((-3.4, 23.2352590367)):
            Rectangle(SKETCH012_W, SKETCH012_H)
        with Locations((3.4, 23.2352590367)):
            Rectangle(SKETCH012_W, SKETCH012_H)
    extrude(amount=PAD007_DEPTH)

    # Sketch013 (on Face33 of Pad007) → Pocket005 (cut, through all)
    with BuildSketch(Plane(origin=(5.1, -4.5, 0), x_dir=(0, 1, 0), z_dir=(1, 0, 0))):
        with BuildLine():
            ThreePointArc((-42.925, 28.7693325629), (-44.625, 30.4693325629), (-46.325, 28.7693325629))
            Line((-46.325, 28.7693325629), (-46.325, 17.7011855106))
            ThreePointArc((-46.325, 17.7011855106), (-44.625, 16.0011855106), (-42.925, 17.7011855106))
            Line((-42.925, 28.7693325629), (-42.925, 17.7011855106))
        make_face()
    extrude(amount=-POCKET005_DEPTH, mode=Mode.SUBTRACT)

    # Sketch017 (on Face30 of Pocket005) → Pocket008 (cut)
    with BuildSketch(Plane(origin=(0, -4.5, 31.7935528056), x_dir=(1, 0, 0), z_dir=(0, 0, 1))):
        with Locations((-3.3679491924, -41.75)):
            Circle(SKETCH017_R)
        with Locations((3.3679491924, -41.75)):
            Circle(SKETCH017_R)
        with Locations((-3.3679491924, -47.5)):
            Circle(SKETCH017_R)
        with Locations((3.3679491924, -47.5)):
            Circle(SKETCH017_R)
    extrude(amount=-POCKET008_DEPTH, mode=Mode.SUBTRACT)

    # Sketch019 (on Face6 of Pocket008) → Pad008 (join)
    with BuildSketch(Plane(origin=(0, -53, 0), x_dir=(-1, 0, 0), z_dir=(0, 1, 0))):
        with BuildLine():
            ThreePointArc((29.3729634054, 15.0409115677), (28.645422971, 16.3841308226), (27.8564999708, 17.6922415023))
            Line((25.3564999708, 17.6922415023), (27.8564999708, 17.6922415023))
            Line((25.3564999708, 17.6922415023), (25.3564999708, 14.6769652679))
            Line((25.3564999708, 14.6769652679), (29.1504409553, 14.6769652679))
            ThreePointArc((29.1504409553, 14.6769652679), (29.3637325104, 14.796555481), (29.3729634054, 15.0409115677))
        make_face()
    pad008 = extrude(amount=PAD008_DEPTH)

    # Sketch020 (on Face30 of Pad008) → Pocket009 (cut)
    with BuildSketch(Plane(origin=(0, -4.5, 17.6922415023), x_dir=(1, 0, 0), z_dir=(0, 0, 1))):
        with Locations((-26.988867595, -45.2352647517)):
            Circle(SKETCH020_R)
        with Locations((-26.2241323467, -46.7647352483)):
            Circle(SKETCH020_R)
    pocket009 = extrude(amount=-POCKET009_DEPTH, mode=Mode.SUBTRACT)

    # Mirrored: Pad008 across Sketch019 V_Axis
    add(pad008.mirror(Plane(origin=(0, -53, 0), x_dir=(0, 1, 0), z_dir=(-1, 0, 0))))

    # Mirrored001: Pocket009 across Sketch020 V_Axis
    add(pocket009.mirror(Plane(origin=(0, -4.5, 17.6922415023), x_dir=(0, 0, 1), z_dir=(1, 0, 0))), mode=Mode.SUBTRACT)

    # Fillet
    fillet_edges = [part.edges().sort_by_distance(p)[0] for p in [
        (5.1, -53, 23.235259),
        (-5.1, -53, 23.235259),
    ]]
    fillet(fillet_edges, radius=FILLET_R)

    # Chamfer
    chamfer_edges = [part.edges().sort_by_distance(p)[0] for p in [
        (-25.3565, -53, 16.184603),
    ]]
    chamfer(chamfer_edges, length=CHAMFER_SIZE)

    # Chamfer001
    chamfer001_edges = [part.edges().sort_by_distance(p)[0] for p in [
        (25.3565, -53, 16.184603),
    ]]
    chamfer(chamfer001_edges, length=CHAMFER001_SIZE)

    # Fillet006
    fillet006_edges = [part.edges().sort_by_distance(p)[0] for p in [
        (-25.3565, -49, 16.184603),
    ]]
    fillet(fillet006_edges, radius=FILLET006_R)

    # Fillet007
    fillet007_edges = [part.edges().sort_by_distance(p)[0] for p in [
        (25.3565, -49, 16.184603),
    ]]
    fillet(fillet007_edges, radius=FILLET007_R)


solid = part.part
